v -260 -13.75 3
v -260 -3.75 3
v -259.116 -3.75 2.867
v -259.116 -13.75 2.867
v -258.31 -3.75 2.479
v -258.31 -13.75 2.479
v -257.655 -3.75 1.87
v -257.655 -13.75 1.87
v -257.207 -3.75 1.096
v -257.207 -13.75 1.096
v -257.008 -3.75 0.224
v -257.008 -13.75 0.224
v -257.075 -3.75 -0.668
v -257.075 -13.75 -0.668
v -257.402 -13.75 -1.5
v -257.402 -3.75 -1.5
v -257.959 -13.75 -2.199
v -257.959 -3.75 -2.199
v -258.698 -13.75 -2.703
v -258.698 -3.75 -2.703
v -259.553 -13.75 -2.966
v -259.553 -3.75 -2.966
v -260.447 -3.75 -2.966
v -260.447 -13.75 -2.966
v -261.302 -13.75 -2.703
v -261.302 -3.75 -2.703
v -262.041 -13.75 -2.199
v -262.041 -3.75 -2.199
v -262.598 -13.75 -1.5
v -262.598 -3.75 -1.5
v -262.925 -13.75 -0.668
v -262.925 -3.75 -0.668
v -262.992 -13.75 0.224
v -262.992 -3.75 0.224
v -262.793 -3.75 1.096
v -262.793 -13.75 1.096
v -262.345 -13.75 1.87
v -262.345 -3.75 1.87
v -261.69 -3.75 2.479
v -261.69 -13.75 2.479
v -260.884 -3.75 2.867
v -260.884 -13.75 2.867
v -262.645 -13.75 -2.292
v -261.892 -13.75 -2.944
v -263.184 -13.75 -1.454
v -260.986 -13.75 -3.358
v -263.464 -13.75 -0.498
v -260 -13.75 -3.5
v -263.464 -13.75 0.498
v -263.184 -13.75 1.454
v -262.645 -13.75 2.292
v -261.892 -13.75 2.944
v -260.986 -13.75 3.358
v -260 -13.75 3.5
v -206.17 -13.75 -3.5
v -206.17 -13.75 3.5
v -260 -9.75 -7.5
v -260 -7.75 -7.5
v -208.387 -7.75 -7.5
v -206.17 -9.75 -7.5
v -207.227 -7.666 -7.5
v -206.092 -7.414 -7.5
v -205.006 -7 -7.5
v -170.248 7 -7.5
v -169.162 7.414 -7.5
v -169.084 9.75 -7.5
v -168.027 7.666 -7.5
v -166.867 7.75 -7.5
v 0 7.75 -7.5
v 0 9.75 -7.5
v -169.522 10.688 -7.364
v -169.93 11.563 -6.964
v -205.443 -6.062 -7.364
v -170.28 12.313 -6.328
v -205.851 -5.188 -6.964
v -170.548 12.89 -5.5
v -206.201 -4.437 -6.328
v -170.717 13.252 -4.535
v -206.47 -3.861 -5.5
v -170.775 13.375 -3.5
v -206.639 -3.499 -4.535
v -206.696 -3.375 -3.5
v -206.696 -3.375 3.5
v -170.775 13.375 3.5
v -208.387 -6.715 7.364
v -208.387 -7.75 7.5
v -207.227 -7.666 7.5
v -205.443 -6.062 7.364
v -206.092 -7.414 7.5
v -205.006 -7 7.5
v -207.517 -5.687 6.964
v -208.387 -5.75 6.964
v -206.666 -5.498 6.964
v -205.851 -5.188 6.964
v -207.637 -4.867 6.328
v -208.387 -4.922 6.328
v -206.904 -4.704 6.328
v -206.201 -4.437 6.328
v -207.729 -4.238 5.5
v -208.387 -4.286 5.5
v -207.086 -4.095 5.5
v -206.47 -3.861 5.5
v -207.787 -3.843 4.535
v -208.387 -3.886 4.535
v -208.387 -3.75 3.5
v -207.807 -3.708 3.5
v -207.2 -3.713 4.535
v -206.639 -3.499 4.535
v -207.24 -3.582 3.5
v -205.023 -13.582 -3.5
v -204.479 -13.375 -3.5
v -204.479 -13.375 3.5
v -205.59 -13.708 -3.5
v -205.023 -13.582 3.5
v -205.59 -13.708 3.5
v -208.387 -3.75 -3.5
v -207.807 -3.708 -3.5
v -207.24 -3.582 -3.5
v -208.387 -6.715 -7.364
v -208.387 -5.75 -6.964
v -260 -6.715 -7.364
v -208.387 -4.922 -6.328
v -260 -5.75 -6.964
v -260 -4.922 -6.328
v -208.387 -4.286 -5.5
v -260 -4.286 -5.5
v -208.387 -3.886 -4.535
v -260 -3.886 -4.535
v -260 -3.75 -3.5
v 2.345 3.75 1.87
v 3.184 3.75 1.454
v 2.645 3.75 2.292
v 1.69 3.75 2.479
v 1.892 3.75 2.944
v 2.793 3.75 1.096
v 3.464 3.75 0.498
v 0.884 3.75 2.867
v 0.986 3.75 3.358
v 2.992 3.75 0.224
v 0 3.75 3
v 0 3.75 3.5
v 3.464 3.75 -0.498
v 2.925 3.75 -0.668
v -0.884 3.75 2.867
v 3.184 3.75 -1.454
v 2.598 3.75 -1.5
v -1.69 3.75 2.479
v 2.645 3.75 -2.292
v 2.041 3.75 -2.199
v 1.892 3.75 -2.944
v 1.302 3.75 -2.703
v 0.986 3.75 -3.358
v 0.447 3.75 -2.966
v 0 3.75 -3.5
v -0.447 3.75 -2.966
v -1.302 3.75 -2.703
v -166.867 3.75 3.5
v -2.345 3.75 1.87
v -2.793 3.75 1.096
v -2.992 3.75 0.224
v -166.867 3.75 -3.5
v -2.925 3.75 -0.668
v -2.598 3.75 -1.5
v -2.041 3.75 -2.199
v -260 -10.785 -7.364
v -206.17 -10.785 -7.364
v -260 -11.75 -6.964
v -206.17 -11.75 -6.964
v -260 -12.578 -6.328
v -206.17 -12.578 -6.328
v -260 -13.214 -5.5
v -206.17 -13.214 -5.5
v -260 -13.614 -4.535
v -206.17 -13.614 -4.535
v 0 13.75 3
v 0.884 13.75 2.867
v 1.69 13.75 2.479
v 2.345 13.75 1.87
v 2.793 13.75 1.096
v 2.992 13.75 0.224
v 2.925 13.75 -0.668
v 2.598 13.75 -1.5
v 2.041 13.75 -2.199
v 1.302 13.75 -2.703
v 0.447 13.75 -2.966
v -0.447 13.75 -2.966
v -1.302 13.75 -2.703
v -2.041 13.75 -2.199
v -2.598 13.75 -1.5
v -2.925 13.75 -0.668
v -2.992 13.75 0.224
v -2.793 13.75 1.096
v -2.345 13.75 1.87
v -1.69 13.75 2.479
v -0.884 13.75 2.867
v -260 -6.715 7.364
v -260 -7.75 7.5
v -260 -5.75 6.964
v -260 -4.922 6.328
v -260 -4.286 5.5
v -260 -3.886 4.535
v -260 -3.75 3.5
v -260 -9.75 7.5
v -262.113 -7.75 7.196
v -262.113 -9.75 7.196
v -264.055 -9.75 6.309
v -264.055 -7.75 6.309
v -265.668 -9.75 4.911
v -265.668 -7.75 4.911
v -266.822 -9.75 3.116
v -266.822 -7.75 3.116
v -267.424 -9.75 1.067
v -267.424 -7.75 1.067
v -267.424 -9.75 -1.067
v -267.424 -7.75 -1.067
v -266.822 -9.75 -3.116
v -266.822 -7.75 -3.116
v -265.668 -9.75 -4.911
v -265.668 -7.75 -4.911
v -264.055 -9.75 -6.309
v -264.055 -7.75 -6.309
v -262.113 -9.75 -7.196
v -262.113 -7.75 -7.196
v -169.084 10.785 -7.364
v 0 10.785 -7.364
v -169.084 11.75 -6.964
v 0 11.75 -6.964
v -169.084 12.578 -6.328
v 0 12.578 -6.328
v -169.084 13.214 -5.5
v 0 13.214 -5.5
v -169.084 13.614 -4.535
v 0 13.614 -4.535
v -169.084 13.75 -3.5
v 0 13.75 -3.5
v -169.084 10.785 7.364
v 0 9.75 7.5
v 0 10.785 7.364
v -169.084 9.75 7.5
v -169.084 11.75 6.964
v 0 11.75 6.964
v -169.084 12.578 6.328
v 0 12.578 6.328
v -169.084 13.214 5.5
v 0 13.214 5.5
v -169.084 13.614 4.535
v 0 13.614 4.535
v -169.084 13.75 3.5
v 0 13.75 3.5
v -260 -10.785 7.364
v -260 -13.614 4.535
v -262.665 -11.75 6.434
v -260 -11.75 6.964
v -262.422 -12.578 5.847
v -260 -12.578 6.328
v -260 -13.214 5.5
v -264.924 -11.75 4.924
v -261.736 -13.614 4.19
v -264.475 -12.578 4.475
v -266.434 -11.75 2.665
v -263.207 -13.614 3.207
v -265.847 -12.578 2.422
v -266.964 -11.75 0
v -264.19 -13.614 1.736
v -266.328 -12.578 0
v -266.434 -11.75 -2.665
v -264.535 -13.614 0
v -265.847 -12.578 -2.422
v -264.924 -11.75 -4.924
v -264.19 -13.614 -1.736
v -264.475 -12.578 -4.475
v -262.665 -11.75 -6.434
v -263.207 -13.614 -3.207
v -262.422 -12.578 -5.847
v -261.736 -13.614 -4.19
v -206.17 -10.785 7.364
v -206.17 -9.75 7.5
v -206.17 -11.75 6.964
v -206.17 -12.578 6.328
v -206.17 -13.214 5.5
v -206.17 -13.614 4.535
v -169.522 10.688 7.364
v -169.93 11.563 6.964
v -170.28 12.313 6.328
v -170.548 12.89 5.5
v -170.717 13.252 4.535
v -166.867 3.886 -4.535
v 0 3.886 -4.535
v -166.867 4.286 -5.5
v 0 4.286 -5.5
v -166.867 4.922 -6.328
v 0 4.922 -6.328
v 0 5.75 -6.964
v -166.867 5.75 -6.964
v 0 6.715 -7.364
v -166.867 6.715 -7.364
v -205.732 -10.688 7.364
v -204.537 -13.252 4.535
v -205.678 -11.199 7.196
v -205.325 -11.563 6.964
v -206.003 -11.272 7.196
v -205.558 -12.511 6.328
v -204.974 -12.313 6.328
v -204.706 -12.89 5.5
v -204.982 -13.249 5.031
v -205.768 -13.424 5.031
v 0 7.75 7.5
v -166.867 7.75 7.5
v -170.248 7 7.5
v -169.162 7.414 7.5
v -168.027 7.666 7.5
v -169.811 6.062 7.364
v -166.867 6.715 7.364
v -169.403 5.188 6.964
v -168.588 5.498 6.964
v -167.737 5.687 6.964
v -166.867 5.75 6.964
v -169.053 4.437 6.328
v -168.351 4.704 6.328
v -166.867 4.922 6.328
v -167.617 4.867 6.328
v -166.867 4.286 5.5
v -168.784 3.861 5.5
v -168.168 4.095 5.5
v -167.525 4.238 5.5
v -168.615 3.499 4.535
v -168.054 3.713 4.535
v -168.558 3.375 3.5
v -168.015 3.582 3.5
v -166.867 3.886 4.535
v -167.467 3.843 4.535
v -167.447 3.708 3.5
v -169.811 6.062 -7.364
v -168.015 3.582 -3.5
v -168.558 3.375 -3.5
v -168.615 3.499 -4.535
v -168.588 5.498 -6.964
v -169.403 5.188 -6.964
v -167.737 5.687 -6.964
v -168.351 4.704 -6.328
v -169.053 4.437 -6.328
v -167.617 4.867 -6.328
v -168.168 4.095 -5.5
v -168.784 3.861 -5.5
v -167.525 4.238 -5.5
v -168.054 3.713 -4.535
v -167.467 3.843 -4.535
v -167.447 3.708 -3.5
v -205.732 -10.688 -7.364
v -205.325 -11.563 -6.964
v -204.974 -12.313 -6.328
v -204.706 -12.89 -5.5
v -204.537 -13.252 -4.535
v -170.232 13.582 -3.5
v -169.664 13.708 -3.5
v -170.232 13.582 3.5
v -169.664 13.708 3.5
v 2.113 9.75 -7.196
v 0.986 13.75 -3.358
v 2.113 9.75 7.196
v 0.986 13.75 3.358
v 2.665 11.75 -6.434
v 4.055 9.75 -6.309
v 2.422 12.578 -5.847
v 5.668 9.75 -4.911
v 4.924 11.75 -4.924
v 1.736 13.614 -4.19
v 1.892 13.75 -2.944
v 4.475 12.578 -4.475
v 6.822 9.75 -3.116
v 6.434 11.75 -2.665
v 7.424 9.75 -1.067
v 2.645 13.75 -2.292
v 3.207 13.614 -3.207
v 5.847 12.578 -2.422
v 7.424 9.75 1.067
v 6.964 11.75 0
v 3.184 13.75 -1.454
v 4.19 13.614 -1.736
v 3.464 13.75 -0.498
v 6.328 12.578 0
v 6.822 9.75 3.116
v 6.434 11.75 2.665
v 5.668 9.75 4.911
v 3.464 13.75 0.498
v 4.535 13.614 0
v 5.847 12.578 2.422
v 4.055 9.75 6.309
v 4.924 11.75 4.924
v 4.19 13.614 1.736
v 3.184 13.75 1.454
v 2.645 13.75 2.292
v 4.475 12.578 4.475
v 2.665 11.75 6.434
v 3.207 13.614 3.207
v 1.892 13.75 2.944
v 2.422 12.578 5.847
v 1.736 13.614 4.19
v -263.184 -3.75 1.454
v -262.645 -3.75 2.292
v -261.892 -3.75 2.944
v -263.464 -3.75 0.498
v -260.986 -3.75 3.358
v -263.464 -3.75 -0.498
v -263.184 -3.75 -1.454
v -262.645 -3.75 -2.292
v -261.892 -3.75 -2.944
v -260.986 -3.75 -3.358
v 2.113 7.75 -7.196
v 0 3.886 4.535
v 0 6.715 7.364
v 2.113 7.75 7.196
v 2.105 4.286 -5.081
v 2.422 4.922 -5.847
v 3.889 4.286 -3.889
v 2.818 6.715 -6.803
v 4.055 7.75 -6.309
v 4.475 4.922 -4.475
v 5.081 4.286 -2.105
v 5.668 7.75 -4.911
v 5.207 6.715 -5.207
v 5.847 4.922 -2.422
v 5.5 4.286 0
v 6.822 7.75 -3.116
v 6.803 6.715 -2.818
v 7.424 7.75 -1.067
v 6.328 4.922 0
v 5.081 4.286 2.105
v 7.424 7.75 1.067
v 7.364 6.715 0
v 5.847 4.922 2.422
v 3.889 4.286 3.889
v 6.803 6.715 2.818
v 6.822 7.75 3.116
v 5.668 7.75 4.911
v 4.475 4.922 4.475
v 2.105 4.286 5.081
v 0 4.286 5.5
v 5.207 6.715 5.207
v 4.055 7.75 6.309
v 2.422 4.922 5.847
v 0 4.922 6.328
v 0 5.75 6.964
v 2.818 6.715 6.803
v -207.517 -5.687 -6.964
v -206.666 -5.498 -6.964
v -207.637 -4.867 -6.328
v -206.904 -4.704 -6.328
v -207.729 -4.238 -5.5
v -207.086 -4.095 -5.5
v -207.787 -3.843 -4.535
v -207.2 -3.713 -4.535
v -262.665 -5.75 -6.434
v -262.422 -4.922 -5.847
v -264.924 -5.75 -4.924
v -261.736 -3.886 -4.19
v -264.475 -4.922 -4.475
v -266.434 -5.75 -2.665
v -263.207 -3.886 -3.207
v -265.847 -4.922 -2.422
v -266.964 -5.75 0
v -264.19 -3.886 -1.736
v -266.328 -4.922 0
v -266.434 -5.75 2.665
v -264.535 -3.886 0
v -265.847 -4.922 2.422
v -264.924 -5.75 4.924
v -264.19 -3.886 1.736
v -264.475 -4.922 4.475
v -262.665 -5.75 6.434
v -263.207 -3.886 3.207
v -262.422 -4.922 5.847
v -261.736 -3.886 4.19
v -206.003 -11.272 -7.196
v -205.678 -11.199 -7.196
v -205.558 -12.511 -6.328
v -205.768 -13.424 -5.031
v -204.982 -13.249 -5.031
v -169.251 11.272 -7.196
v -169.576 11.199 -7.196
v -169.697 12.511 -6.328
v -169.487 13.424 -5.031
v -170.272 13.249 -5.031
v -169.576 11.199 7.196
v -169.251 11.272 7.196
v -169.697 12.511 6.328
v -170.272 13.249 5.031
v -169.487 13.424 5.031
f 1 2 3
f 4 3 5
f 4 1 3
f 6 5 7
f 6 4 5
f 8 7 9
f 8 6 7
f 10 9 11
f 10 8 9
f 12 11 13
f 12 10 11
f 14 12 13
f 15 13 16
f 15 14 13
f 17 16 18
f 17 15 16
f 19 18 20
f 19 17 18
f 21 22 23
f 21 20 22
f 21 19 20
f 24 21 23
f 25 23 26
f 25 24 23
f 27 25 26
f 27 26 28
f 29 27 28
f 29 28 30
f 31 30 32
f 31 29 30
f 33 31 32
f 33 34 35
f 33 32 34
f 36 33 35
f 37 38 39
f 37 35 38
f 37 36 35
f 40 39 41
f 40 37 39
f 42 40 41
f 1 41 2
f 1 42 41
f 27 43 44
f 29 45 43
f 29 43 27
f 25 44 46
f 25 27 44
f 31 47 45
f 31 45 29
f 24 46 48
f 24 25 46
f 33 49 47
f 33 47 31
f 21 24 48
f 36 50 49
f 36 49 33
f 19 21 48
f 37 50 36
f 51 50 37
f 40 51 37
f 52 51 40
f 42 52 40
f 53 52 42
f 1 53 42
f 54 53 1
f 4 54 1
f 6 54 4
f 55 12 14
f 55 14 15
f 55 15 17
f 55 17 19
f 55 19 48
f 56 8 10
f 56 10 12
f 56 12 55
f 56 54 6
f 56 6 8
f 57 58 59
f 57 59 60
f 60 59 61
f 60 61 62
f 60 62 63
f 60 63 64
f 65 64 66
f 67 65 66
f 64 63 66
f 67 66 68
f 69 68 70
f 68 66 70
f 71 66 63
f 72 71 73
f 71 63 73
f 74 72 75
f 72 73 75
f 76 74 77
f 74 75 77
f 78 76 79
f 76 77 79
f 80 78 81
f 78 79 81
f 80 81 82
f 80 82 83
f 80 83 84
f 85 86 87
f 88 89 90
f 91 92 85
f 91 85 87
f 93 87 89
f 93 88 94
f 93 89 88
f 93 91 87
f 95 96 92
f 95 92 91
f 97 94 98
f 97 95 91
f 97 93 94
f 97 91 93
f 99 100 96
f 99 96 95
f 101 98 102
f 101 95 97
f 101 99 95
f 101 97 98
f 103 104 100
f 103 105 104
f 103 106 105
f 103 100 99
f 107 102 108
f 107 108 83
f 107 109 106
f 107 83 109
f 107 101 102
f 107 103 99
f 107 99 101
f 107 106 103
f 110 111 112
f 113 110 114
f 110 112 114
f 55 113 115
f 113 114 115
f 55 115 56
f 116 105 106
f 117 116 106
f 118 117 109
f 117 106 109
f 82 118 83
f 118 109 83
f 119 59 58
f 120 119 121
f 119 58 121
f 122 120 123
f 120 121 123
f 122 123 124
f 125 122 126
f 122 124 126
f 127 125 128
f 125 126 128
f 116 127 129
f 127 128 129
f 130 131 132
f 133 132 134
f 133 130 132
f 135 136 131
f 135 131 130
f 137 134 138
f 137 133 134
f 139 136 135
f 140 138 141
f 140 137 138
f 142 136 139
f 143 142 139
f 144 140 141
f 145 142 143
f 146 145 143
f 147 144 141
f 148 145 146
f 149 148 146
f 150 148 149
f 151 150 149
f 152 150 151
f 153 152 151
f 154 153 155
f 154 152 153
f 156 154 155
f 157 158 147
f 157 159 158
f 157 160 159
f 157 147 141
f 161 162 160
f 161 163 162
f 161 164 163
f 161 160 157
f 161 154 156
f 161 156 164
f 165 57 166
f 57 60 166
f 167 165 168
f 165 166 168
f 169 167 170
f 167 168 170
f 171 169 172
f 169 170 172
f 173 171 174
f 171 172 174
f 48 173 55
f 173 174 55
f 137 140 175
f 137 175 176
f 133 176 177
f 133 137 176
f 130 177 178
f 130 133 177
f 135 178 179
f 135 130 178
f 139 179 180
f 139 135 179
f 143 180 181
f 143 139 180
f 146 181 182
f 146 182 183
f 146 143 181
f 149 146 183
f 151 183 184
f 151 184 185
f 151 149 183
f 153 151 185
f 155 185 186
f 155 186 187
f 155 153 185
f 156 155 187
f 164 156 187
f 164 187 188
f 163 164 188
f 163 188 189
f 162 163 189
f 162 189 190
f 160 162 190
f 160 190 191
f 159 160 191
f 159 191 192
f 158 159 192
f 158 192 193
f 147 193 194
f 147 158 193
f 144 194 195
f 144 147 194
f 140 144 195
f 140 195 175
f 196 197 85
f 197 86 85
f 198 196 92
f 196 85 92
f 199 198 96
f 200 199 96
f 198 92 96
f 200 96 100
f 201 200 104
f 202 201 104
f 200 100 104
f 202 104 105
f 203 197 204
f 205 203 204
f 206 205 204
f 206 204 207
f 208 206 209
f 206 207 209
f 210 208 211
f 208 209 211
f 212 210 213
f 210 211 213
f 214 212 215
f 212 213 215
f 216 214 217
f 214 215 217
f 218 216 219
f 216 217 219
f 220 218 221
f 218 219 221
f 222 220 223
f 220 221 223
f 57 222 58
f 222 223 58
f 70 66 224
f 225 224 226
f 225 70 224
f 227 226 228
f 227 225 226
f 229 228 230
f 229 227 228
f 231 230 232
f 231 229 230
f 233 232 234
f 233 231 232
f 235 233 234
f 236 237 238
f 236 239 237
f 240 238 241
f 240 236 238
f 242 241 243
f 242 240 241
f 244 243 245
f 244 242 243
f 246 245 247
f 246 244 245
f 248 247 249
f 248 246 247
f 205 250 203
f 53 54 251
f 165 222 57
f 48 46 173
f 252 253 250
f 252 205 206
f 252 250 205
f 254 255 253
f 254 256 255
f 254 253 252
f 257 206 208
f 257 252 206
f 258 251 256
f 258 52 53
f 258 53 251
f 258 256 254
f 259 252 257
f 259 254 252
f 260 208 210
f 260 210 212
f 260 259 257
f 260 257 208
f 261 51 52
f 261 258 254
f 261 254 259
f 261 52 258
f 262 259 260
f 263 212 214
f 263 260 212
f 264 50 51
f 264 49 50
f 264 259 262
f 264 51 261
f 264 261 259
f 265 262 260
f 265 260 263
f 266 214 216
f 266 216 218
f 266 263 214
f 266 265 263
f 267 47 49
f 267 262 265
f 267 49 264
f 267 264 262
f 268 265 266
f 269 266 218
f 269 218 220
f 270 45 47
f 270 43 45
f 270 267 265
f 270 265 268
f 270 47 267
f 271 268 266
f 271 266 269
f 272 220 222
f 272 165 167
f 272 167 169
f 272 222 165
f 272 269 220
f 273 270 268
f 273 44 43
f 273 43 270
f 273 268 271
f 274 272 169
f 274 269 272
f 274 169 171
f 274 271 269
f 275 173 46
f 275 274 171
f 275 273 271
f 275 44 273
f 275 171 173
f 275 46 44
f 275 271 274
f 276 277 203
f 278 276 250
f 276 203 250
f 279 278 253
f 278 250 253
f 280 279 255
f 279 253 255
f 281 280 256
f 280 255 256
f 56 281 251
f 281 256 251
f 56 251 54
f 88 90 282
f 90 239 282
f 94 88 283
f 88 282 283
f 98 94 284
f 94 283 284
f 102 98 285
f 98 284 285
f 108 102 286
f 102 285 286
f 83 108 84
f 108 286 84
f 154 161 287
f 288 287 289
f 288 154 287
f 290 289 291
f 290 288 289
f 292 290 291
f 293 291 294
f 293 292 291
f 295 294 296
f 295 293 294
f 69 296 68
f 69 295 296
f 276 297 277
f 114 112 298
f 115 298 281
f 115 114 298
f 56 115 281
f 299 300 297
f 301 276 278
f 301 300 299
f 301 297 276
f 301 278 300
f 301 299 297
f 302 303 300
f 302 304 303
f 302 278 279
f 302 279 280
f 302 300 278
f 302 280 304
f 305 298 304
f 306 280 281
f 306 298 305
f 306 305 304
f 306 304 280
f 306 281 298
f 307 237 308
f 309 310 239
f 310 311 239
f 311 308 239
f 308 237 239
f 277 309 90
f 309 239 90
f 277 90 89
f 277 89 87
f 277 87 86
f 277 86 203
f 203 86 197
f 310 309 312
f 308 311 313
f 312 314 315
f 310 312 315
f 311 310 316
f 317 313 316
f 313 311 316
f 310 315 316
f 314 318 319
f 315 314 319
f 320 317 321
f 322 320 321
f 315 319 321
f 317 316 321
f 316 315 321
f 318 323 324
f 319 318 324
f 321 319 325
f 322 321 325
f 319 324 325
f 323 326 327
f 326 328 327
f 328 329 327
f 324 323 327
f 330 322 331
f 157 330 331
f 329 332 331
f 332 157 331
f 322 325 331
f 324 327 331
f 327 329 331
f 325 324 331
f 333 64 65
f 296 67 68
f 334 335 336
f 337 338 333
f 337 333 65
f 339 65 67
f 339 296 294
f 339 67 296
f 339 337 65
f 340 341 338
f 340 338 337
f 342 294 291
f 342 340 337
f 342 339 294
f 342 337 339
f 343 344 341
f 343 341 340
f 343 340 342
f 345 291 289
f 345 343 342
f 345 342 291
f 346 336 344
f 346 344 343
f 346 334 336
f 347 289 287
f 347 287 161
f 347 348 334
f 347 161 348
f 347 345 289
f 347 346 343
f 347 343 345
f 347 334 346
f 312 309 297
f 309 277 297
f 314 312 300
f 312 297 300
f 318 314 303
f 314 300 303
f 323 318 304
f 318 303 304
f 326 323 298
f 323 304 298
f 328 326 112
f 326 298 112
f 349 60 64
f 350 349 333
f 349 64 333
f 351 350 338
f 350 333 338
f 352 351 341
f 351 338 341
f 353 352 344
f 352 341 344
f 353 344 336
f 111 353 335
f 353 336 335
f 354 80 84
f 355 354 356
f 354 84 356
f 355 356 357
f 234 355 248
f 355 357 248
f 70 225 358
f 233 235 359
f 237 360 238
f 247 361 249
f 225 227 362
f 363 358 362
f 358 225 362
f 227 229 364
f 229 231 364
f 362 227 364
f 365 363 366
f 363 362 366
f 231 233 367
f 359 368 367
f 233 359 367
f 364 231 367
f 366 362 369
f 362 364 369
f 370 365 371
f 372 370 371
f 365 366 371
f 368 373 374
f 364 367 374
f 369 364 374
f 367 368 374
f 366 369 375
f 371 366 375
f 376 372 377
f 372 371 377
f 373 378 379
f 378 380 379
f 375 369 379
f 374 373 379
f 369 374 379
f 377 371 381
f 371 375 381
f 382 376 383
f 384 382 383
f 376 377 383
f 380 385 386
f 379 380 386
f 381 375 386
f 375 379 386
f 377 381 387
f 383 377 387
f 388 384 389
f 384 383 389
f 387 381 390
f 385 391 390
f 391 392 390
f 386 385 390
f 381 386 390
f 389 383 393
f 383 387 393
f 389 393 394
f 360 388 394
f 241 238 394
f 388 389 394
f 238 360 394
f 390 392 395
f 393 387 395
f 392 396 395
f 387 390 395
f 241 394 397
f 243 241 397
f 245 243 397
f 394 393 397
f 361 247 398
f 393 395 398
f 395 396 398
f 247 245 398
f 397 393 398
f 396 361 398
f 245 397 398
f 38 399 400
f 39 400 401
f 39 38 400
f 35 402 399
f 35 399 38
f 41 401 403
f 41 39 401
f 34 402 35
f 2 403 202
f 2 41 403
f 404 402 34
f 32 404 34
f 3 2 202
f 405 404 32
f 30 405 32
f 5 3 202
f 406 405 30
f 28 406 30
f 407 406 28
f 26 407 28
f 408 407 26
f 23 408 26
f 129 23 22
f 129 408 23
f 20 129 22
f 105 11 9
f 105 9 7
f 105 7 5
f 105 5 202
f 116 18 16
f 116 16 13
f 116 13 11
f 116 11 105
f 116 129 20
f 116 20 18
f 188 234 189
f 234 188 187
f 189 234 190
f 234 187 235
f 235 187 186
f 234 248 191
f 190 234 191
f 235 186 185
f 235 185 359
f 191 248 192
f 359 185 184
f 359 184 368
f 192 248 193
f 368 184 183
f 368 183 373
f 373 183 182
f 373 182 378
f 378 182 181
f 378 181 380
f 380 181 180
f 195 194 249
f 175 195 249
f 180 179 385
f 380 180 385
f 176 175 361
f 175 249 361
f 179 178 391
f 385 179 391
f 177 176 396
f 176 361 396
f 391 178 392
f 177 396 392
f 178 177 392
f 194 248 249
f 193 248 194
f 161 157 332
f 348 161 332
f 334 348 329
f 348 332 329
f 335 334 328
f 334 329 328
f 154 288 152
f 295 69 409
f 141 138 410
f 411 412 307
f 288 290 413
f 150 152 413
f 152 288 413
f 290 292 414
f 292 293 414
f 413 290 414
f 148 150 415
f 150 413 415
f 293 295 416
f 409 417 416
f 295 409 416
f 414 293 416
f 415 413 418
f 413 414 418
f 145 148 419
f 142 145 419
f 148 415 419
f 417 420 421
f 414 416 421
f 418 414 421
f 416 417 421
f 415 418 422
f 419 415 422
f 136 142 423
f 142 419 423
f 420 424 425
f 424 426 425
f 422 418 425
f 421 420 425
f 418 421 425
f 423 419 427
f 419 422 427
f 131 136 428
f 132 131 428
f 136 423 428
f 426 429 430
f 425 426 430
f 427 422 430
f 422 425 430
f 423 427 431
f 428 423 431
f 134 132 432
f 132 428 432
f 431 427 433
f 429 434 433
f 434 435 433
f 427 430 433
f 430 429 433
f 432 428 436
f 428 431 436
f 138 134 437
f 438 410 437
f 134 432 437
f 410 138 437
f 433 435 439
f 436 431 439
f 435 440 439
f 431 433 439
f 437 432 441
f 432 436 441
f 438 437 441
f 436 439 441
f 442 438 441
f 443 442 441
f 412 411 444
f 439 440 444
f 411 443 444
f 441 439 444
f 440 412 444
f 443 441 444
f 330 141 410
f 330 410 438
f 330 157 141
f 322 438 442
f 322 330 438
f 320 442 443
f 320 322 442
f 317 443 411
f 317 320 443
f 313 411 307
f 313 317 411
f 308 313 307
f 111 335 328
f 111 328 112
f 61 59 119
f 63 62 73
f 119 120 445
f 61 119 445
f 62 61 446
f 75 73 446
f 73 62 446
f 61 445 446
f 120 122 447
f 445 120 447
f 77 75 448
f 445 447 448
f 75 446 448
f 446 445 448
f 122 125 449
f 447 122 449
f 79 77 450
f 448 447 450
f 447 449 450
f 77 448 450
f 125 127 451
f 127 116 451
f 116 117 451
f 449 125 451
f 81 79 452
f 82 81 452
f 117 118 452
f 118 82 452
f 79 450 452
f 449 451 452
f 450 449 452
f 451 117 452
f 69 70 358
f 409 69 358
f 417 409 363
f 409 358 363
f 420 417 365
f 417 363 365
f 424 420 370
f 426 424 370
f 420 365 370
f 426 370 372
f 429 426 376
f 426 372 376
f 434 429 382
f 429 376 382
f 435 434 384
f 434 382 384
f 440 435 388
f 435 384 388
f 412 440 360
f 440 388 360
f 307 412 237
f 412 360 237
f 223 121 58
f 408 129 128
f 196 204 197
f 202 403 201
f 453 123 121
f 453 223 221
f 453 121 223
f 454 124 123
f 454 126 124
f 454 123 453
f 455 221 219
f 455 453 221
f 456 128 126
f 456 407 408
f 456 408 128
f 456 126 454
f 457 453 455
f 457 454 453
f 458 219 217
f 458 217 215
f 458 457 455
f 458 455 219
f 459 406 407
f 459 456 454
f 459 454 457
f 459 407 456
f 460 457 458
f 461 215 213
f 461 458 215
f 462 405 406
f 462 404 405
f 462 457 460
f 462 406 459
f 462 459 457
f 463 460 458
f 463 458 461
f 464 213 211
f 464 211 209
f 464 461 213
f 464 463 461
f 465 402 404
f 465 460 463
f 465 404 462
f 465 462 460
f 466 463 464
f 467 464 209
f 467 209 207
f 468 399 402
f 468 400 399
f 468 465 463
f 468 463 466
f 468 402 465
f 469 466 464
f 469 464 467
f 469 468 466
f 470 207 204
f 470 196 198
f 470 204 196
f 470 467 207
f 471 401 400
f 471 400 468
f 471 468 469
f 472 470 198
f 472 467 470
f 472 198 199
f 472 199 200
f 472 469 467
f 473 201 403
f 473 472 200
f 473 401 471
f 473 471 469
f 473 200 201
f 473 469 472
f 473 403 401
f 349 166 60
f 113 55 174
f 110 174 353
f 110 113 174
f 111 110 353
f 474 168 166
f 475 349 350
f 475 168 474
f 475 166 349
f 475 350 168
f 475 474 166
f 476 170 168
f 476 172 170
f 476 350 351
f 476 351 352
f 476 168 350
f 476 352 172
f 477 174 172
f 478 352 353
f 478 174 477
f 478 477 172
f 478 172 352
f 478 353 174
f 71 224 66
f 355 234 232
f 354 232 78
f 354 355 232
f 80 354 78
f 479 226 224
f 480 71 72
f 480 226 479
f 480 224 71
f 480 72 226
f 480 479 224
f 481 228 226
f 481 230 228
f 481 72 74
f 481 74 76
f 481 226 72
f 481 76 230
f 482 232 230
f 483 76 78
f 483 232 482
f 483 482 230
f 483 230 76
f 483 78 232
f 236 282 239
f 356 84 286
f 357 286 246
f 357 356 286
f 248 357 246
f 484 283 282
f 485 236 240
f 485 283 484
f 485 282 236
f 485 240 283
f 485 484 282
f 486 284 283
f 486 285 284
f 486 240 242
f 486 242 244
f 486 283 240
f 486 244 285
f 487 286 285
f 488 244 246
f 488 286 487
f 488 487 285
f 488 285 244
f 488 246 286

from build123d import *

# Parameters (mm, degrees)
CROQUIS1_R                 = 3
SALIENTE_EXTRUIR1_DEPTH    = 13.75
CORTAR_EXTRUIR1_DEPTH      = 268.958135723
CORTAR_EXTRUIR1_DEPTH_BACK = 268.958135723
CROQUIS3_OUTSIDE_W         = 84.856
CROQUIS3_OUTSIDE_H         = 332.356
REDONDEO5_R                = 4


with BuildPart() as part:
    # Croquis1 → Saliente-Extruir1 (new, symmetric)
    with BuildSketch(Plane(origin=(0, 0, 0), x_dir=(-1, 0, 0), z_dir=(0, 1, 0))):
        with BuildLine():
            Line((0, 7.5), (260, 7.5))
            ThreePointArc((260, 7.5), (267.5, 0), (260, -7.5))
            Line((260, -7.5), (0, -7.5))
            ThreePointArc((0, -7.5), (-7.5, 0), (0, 7.5))
        make_face()
        with Locations(Location((0, 0, 0), (0, 0, 90))):
            Circle(CROQUIS1_R, mode=Mode.SUBTRACT)
        with Locations(Location((260, 0, 0), (0, 0, 90))):
            Circle(CROQUIS1_R, mode=Mode.SUBTRACT)
    extrude(amount=SALIENTE_EXTRUIR1_DEPTH, both=True)

    # Croquis3 outside → Cortar-Extruir1 (cut, two sides: drawn at the far end of the back side and taken through both)
    with BuildSketch(Plane(origin=(0, 0, 0), x_dir=(0, 1, 0), z_dir=(0, 0, 1)).offset(-CORTAR_EXTRUIR1_DEPTH_BACK)):
        with Locations((0, 130)):
            Rectangle(CROQUIS3_OUTSIDE_W, CROQUIS3_OUTSIDE_H)
        Polygon((13.75, 169.971128891), (13.75, -7.5), (3.75, -7.5), (3.75, 167.754182265), (-13.75, 205.283053374), (-13.75, 267.5), (-3.75, 267.5), (-3.75, 207.5), align=None, mode=Mode.SUBTRACT)
    extrude(amount=CORTAR_EXTRUIR1_DEPTH + CORTAR_EXTRUIR1_DEPTH_BACK, mode=Mode.SUBTRACT)

    # Redondeo5
    redondeo5_edges = [part.edges().sort_by_distance(p)[0] for p in [
        (-84.985564446, 13.75, 7.5),
        (-232.641526687, -13.75, -7.5),
        (-186.518617819, -5, -7.5),
        (-83.877091132, 3.75, -7.5),
        (-167.754182265, 3.75, 0),
        (-83.877091132, 3.75, 7.5),
        (7.5, 3.75, 0),
        (-207.5, -3.75, 0),
        (-233.75, -3.75, 7.5),
        (-267.5, -3.75, 0),
        (-188.735564446, 5, -7.5),
        (-233.75, -3.75, -7.5),
        (-169.971128891, 13.75, 0),
        (-188.735564446, 5, 7.5),
        (-205.283053374, -13.75, 0),
        (-186.518617819, -5, 7.5),
        (7.5, 13.75, 0),
        (-232.641526687, -13.75, 7.5),
        (-267.5, -13.75, 0),
        (-84.985564446, 13.75, -7.5),
    ]]
    fillet(redondeo5_edges, radius=REDONDEO5_R)


solid = part.part
